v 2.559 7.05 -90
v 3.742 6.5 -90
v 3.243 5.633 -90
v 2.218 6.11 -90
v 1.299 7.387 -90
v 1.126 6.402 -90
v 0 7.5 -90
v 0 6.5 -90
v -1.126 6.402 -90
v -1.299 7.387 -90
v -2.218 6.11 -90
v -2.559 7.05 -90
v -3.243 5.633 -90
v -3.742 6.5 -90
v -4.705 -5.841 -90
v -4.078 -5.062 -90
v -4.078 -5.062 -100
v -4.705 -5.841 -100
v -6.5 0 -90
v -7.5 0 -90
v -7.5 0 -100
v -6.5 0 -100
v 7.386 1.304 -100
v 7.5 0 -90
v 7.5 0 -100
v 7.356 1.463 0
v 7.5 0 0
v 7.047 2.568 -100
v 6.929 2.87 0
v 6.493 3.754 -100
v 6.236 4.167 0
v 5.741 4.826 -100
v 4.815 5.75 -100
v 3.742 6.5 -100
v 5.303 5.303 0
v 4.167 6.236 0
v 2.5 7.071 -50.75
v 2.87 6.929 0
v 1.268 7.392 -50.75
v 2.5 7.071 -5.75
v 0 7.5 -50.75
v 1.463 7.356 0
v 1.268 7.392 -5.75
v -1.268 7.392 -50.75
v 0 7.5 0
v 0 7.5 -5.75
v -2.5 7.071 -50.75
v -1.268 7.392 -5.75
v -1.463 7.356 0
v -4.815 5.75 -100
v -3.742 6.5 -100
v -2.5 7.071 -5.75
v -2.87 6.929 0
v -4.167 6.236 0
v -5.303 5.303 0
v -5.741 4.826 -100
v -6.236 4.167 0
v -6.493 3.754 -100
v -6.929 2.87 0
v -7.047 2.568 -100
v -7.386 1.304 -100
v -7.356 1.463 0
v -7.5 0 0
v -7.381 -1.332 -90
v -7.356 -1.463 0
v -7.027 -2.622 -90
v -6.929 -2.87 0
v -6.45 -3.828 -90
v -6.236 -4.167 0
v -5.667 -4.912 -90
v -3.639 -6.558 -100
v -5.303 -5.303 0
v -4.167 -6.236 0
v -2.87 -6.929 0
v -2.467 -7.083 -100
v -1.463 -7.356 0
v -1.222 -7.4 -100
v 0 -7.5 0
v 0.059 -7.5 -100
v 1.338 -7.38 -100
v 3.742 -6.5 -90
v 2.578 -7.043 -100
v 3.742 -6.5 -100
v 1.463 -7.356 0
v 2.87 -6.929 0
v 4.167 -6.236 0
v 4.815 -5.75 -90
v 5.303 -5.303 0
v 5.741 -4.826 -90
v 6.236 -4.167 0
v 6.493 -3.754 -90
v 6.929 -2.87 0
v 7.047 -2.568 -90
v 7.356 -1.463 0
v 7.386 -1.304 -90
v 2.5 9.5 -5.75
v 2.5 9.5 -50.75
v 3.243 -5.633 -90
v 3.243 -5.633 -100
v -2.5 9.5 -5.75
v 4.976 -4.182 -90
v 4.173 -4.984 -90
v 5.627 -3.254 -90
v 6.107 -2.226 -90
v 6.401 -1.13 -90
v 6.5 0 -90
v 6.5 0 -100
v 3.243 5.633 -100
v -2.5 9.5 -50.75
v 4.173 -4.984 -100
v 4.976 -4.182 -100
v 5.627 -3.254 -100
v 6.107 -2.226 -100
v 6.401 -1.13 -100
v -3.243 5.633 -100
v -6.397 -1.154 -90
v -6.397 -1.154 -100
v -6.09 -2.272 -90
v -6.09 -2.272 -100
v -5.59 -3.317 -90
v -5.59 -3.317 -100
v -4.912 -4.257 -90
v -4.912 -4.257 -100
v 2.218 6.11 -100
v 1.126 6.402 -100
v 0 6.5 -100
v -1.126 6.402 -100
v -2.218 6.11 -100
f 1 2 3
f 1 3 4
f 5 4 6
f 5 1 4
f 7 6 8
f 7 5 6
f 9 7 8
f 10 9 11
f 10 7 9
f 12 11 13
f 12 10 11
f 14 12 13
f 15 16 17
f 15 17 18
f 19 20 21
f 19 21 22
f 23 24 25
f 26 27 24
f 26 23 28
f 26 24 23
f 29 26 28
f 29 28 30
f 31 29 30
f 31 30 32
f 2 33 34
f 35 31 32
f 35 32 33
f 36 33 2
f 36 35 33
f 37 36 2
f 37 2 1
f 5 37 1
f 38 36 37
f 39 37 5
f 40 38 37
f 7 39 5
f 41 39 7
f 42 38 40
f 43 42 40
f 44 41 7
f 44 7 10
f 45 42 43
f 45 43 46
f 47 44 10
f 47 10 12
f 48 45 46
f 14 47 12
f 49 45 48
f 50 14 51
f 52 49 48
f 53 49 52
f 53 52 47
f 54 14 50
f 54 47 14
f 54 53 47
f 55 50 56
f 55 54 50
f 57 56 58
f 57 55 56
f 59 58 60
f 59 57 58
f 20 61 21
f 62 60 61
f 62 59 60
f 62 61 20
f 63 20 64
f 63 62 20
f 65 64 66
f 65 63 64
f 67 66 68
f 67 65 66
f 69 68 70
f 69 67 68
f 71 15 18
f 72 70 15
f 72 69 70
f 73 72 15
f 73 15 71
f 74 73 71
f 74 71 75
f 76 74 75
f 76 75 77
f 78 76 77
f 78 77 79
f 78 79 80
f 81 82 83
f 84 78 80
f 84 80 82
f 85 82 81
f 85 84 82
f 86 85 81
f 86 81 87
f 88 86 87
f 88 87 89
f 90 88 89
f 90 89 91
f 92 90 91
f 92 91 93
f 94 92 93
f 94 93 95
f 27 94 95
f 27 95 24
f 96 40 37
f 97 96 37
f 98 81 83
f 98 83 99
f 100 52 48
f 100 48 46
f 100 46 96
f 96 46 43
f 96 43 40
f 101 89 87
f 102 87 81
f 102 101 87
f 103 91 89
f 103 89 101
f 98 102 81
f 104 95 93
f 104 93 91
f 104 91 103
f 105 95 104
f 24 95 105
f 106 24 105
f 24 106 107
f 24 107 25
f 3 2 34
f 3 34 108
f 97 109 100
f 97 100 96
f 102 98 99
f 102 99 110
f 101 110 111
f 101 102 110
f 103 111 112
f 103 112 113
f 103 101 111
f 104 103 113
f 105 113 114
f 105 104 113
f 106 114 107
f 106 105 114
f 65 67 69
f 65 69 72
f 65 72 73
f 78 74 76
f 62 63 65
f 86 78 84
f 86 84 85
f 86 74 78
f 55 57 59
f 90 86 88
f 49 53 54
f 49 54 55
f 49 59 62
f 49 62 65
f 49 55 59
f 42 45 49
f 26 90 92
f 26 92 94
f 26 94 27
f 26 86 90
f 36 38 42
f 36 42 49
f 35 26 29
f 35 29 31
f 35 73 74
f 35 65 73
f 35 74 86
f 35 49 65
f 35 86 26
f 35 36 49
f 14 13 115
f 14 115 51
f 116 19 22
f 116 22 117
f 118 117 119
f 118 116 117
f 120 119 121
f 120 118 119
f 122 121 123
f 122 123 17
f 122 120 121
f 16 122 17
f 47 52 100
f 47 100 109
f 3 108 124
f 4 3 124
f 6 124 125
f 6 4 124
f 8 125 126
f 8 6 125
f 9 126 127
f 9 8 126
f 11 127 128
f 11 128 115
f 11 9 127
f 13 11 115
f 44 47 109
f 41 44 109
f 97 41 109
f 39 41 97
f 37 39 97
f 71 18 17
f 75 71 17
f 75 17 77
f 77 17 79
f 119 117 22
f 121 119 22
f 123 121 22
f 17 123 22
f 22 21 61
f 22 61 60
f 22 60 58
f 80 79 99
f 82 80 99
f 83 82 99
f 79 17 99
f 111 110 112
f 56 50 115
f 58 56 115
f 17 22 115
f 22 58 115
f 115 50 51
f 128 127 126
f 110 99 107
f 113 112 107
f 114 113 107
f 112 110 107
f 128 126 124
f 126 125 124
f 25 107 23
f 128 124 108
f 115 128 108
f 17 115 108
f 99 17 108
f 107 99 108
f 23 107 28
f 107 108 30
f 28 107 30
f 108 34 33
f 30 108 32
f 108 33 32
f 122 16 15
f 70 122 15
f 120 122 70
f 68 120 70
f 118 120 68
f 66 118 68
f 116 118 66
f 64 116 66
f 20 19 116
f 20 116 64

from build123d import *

# Parameters (mm, degrees)
ESBO_O1_R                = 7.5
RESSALTO_EXTRUS_O1_DEPTH = 100
ESBO_O2_W                = 5
ESBO_O2_H                = 45
RESSALTO_EXTRUS_O2_DEPTH = 9.5
CORTE_EXTRUS_O2_START    = -10
CORTE_EXTRUS_O2_DEPTH    = 10
CORTE_EXTRUS_O3_START    = -10
CORTE_EXTRUS_O3_DEPTH    = 10


with BuildPart() as part:
    # Esboço1 → Ressalto-extrusão1 (new body)
    with BuildSketch(Plane.XY):
        Circle(ESBO_O1_R)
    extrude(amount=-RESSALTO_EXTRUS_O1_DEPTH)

    # Esboço2 → Ressalto-extrusão2 (add)
    with BuildSketch(Plane(origin=(0, 0, 0), x_dir=(1, 0, 0), z_dir=(0, 1, 0))):
        with Locations((0, 28.25)):
            Rectangle(ESBO_O2_W, ESBO_O2_H)
    extrude(amount=RESSALTO_EXTRUS_O2_DEPTH)

    # Esboço3 → Corte-extrusão2 (cut)
    with BuildSketch(Plane(origin=(0, 0, -100), x_dir=(-1, 0, 0), z_dir=(0, 0, -1)).offset(CORTE_EXTRUS_O2_START)):
        with BuildLine():
            ThreePointArc((3.741657387, 6.5), (0, 7.5), (-3.741657387, 6.5))
            Line((-3.741657387, 6.5), (-3.242769735, 5.633333333))
            ThreePointArc((-3.242769735, 5.633333333), (0, 6.5), (3.242769735, 5.633333333))
            Line((3.242769735, 5.633333333), (3.741657387, 6.5))
        make_face()
    extrude(amount=CORTE_EXTRUS_O2_DEPTH, mode=Mode.SUBTRACT)

    # Esboço3<5> → Corte-extrusão3 (cut)
    with BuildSketch(Plane(origin=(0, 0, -100), x_dir=(-1, 0, 0), z_dir=(0, 0, -1)).offset(CORTE_EXTRUS_O3_START)):
        with BuildLine():
            Line((-6.5, 0), (-7.5, 0))
            ThreePointArc((-7.5, 0), (-6.492781777, -3.754168989), (-3.741657387, -6.5))
            Line((-3.741657387, -6.5), (-3.242769735, -5.633333333))
            ThreePointArc((-3.242769735, -5.633333333), (-5.62707754, -3.253613124), (-6.5, 0))
        make_face()
        with BuildLine():
            ThreePointArc((6.5, 0), (5.863181424, -2.805905129), (4.077506587, -5.062009485))
            Line((4.077506587, -5.062009485), (4.704815293, -5.840780175))
            ThreePointArc((4.704815293, -5.840780175), (6.765209335, -3.237582841), (7.5, 0))
            Line((7.5, 0), (6.5, 0))
        make_face()
    extrude(amount=CORTE_EXTRUS_O3_DEPTH, mode=Mode.SUBTRACT)


solid = part.part
